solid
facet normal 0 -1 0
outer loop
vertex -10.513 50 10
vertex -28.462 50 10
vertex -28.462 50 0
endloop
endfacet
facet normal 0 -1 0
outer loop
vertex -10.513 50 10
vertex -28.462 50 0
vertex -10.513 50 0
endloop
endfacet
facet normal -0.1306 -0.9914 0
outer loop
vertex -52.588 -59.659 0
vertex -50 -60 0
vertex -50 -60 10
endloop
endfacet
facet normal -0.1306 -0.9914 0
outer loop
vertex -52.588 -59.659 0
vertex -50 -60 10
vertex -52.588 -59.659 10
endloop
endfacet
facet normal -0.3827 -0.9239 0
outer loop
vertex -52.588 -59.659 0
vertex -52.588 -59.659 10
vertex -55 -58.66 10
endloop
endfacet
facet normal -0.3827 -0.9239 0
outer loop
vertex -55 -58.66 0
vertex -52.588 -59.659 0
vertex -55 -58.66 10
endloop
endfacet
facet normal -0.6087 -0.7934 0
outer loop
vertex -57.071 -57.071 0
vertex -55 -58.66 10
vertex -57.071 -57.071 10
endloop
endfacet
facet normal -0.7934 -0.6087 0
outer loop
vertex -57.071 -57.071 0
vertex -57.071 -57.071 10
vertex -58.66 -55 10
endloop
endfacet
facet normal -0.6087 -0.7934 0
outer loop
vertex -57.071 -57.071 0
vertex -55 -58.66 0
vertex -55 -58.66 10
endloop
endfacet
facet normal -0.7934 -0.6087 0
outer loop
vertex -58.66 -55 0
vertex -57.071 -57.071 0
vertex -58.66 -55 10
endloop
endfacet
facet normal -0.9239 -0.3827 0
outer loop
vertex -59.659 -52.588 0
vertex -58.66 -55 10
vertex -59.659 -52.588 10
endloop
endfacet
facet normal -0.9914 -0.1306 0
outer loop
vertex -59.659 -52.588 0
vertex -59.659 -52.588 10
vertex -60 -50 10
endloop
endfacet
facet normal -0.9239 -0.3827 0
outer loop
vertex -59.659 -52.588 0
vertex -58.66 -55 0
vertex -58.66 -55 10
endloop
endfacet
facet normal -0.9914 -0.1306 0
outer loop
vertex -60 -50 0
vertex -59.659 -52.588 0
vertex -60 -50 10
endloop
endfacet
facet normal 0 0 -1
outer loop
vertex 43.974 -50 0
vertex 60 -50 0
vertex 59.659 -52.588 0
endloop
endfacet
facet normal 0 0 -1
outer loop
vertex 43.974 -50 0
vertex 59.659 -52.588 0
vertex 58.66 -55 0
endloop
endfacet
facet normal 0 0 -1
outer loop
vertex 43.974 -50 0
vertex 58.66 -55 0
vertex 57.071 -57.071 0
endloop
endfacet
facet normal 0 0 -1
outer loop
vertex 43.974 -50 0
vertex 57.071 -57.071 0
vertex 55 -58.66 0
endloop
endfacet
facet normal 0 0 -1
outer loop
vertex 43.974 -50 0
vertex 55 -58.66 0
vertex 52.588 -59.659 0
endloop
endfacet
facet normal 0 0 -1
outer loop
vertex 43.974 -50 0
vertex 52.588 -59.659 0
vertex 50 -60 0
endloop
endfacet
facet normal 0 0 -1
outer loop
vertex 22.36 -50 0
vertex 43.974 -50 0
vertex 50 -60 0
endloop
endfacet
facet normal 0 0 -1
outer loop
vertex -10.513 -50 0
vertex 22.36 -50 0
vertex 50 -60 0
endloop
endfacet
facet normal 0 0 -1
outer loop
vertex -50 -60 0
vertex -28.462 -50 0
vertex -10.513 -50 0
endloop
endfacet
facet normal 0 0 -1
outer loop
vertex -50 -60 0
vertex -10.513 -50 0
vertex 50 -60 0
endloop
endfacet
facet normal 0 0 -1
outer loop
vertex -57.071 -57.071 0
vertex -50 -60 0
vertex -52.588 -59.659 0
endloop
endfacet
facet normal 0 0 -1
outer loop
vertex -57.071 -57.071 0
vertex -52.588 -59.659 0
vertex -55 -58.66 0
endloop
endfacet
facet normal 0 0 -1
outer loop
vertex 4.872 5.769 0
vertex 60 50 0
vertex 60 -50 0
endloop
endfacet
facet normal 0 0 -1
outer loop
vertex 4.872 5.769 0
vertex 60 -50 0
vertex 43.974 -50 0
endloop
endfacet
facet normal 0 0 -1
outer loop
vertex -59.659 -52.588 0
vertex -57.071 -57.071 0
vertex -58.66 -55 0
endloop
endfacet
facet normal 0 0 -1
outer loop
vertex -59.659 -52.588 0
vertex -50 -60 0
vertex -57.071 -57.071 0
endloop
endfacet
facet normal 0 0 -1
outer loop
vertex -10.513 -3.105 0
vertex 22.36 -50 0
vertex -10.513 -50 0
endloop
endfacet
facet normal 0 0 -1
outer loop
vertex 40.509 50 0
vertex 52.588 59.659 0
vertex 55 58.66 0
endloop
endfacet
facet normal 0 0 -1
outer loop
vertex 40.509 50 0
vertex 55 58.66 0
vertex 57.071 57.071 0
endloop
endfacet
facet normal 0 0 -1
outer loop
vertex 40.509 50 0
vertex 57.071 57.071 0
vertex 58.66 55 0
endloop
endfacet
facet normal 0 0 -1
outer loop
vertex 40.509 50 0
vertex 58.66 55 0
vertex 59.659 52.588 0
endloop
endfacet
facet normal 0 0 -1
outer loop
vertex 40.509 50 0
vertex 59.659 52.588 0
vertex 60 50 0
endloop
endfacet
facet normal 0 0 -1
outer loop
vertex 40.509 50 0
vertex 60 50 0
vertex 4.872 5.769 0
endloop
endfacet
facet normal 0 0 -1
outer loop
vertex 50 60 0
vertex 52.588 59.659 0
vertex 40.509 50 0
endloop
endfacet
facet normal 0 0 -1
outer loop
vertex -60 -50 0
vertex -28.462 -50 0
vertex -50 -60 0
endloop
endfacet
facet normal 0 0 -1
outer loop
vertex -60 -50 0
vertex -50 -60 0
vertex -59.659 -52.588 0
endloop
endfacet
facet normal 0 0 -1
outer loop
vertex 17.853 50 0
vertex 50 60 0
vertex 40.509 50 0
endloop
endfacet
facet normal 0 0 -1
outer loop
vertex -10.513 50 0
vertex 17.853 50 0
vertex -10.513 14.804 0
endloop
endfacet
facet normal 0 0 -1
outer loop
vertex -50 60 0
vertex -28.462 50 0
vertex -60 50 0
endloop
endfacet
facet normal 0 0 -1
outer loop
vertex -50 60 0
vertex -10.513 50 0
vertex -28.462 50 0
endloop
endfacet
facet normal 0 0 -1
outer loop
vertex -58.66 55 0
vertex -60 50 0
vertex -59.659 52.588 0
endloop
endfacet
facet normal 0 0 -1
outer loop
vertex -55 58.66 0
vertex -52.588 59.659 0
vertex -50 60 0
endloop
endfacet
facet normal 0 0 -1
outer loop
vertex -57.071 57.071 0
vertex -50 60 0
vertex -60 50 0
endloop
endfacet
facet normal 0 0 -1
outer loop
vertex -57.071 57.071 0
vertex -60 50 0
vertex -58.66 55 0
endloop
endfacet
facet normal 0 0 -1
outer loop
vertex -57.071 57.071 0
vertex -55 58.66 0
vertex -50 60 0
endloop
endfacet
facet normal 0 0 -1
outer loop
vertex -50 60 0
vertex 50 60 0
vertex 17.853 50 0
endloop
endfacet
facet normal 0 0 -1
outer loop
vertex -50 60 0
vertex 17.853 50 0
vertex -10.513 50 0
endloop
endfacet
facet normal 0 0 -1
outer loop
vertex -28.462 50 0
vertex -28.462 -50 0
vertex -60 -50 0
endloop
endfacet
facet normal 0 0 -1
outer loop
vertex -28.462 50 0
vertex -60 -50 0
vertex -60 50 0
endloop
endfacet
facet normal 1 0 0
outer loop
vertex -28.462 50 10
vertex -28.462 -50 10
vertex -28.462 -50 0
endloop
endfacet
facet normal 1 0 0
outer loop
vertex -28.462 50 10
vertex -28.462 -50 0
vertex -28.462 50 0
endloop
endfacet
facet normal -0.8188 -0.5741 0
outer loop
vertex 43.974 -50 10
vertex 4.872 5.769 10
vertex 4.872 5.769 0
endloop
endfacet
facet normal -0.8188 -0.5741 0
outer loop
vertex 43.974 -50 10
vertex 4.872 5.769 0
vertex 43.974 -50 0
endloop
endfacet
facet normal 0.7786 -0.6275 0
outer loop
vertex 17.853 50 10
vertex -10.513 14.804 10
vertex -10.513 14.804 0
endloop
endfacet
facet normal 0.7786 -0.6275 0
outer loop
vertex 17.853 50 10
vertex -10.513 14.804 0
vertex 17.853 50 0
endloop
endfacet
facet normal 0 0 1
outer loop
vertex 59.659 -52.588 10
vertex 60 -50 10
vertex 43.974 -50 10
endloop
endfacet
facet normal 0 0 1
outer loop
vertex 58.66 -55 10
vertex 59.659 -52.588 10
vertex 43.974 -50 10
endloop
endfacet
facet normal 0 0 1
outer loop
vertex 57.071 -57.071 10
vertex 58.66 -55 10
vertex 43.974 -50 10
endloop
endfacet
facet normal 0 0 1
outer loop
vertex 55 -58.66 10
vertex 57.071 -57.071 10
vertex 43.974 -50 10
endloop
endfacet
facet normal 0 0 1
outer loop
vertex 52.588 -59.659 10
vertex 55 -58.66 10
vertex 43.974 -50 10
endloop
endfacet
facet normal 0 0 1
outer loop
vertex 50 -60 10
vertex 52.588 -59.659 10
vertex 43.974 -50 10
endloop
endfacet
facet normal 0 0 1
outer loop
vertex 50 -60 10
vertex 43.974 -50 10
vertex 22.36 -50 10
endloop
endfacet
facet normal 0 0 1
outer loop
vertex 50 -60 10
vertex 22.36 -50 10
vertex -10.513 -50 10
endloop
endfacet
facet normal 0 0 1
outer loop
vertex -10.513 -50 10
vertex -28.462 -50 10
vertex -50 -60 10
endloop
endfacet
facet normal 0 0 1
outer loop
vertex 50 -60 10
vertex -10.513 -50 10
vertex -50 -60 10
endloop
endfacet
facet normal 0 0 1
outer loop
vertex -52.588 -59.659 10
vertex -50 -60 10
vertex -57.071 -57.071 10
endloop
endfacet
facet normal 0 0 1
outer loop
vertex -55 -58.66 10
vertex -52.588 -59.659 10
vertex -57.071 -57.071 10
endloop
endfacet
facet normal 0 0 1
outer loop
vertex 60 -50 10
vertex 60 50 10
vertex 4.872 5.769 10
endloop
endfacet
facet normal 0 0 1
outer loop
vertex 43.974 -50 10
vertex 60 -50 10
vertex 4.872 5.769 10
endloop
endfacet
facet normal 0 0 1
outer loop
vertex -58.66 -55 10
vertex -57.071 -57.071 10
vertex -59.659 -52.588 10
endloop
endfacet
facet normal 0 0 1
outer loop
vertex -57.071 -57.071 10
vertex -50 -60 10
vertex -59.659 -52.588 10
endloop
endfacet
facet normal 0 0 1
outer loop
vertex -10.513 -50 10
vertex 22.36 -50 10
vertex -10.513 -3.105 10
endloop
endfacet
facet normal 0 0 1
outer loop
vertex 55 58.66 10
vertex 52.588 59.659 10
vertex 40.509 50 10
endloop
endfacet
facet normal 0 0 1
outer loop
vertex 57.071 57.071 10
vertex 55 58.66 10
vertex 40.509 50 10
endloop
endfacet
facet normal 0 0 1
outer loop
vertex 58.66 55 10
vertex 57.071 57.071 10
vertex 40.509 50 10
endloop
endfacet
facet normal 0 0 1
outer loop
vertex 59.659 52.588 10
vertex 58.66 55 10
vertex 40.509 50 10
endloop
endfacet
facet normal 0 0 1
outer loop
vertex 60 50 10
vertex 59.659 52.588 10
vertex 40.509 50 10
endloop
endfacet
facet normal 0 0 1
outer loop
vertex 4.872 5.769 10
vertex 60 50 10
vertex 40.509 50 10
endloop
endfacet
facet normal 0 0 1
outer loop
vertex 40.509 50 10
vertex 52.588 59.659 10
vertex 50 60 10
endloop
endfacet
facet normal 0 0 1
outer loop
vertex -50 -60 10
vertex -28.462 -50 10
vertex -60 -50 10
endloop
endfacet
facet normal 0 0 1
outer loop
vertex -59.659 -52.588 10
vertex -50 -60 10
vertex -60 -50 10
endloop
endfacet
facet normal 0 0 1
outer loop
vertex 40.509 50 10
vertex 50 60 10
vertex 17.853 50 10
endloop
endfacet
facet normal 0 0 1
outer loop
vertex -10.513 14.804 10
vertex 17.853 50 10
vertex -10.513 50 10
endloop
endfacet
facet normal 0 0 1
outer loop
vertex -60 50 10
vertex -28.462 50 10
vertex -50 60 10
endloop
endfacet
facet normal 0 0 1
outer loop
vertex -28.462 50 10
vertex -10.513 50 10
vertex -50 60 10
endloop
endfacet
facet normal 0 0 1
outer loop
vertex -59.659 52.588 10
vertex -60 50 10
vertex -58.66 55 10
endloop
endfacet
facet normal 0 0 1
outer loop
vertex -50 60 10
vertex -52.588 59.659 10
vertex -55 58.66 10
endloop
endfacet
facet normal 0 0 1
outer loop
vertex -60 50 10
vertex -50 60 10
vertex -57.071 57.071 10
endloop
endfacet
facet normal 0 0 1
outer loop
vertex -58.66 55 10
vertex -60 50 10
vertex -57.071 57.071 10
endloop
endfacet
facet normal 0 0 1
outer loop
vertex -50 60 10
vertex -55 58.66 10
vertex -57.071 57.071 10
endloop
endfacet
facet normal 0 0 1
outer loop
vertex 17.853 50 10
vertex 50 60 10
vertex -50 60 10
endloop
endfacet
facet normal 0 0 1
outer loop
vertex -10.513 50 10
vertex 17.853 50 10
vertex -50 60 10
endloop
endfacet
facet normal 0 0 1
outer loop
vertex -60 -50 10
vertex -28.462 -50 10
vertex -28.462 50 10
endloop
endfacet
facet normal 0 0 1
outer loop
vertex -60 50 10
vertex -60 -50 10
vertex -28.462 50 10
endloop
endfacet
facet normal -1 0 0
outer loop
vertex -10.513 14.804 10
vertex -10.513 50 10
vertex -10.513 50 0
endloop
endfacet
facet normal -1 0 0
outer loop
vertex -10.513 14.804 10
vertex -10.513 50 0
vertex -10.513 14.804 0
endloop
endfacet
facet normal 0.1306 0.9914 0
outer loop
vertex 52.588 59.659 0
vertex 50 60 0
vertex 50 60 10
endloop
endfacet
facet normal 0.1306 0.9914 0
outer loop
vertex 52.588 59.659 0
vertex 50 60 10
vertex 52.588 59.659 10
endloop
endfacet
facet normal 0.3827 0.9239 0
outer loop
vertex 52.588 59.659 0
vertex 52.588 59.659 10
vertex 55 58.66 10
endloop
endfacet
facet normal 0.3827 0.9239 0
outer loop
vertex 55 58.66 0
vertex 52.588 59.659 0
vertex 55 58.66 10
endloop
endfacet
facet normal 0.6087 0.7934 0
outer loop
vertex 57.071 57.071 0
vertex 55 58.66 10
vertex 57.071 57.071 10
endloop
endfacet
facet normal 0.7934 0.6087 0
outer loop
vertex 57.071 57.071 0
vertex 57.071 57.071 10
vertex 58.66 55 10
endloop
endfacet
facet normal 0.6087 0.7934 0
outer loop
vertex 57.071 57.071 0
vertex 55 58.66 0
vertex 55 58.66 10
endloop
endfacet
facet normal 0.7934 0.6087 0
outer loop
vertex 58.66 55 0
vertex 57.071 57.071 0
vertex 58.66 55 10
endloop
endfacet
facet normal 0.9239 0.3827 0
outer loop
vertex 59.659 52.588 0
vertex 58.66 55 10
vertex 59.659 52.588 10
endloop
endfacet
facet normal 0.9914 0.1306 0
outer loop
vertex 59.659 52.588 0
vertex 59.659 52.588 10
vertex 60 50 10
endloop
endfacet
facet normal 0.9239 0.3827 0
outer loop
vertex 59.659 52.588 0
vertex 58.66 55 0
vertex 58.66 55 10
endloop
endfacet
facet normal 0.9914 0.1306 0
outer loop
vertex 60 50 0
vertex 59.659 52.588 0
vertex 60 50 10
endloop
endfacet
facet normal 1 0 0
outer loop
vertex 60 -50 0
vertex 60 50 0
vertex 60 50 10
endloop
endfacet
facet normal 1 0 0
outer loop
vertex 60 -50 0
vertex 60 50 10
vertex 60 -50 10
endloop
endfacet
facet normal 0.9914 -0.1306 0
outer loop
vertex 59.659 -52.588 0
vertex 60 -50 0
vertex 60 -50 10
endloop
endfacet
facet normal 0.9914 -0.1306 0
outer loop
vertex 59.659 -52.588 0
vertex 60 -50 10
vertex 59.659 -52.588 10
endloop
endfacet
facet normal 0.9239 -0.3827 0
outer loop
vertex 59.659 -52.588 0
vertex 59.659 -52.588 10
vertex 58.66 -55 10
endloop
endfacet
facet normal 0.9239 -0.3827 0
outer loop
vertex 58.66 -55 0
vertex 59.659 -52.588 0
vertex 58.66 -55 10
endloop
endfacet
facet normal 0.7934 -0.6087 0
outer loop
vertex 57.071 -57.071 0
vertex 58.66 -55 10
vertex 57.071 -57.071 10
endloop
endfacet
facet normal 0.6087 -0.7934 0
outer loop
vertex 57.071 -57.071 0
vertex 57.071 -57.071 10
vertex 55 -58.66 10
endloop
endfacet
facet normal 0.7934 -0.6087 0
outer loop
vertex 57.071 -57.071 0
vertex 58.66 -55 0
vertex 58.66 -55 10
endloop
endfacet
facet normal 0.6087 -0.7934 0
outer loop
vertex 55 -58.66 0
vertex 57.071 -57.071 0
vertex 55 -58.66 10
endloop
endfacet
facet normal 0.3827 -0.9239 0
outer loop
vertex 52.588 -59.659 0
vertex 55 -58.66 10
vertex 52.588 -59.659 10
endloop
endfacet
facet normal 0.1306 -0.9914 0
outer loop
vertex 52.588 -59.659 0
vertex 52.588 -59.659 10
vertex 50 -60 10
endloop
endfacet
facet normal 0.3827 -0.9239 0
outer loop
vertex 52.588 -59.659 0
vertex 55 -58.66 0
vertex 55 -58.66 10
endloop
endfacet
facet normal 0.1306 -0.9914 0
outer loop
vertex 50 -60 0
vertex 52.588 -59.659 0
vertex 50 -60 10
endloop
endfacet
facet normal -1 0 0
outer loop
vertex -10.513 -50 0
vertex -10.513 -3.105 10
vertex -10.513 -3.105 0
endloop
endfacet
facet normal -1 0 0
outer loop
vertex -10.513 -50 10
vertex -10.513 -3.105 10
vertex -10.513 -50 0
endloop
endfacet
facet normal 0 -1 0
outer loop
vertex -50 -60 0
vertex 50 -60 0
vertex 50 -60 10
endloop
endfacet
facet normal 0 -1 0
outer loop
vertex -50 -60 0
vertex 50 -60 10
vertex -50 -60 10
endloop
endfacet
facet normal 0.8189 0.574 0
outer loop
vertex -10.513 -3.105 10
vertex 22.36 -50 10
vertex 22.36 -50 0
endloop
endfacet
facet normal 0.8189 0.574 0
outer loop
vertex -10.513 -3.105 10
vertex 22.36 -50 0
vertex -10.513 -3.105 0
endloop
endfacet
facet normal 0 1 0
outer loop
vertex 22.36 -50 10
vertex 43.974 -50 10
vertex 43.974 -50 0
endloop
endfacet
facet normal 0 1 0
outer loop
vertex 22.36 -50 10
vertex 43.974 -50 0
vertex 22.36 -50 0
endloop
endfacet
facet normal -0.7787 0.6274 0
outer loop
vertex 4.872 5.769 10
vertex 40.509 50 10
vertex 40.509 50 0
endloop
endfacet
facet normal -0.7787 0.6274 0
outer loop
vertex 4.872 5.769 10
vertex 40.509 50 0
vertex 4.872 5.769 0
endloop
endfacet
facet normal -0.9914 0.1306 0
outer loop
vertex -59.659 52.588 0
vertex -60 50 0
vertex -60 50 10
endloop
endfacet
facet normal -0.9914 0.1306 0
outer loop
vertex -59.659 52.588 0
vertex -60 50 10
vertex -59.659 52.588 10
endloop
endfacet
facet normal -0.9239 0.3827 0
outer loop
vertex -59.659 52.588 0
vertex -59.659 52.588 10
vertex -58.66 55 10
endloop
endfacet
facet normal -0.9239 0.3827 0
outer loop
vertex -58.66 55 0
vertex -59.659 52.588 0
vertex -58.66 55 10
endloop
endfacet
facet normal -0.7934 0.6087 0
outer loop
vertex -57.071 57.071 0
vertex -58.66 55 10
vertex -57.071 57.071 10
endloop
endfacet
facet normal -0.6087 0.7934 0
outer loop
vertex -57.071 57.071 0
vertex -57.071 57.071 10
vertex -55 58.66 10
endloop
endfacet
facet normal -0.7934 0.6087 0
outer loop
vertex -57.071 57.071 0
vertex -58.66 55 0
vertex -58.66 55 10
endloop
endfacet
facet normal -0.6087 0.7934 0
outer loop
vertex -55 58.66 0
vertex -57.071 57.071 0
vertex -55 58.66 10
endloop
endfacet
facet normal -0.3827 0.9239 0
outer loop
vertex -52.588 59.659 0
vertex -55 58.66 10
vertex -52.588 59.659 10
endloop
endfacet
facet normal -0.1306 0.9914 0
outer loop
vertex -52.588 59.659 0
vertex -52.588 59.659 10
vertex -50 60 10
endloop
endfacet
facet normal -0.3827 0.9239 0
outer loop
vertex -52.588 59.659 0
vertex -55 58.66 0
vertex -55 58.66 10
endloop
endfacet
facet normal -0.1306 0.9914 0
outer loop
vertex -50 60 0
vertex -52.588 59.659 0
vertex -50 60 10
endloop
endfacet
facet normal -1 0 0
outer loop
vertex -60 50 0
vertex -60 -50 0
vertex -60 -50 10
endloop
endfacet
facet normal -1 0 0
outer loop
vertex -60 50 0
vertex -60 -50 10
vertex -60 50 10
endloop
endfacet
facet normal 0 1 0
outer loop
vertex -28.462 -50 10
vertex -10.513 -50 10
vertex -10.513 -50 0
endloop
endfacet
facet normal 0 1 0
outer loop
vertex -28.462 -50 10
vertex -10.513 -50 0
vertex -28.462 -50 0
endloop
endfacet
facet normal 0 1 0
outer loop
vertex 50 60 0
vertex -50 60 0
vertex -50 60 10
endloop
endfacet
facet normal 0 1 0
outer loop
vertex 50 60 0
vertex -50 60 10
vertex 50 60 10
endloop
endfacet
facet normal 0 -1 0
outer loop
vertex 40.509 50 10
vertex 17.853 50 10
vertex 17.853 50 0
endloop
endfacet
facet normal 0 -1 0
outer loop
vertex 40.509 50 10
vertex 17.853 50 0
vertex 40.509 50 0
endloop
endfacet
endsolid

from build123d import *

# Parameters (mm, degrees)
BOSS_EXTRUDE1_DEPTH = 10
CUT_EXTRUDE24_DEPTH = 10


with BuildPart() as part:
    # Sketch1 → Boss-Extrude1 (new body)
    with BuildSketch(Plane.XY):
        with BuildLine():
            Line((-50, 60), (50, 60))
            ThreePointArc((50, 60), (57.071067812, 57.071067812), (60, 50))
            Line((60, 50), (60, -50))
            ThreePointArc((60, -50), (57.071067812, -57.071067812), (50, -60))
            Line((50, -60), (-50, -60))
            ThreePointArc((-50, -60), (-57.071067812, -57.071067812), (-60, -50))
            Line((-60, -50), (-60, 50))
            ThreePointArc((-60, 50), (-57.071067812, 57.071067812), (-50, 60))
        make_face()
    extrude(amount=BOSS_EXTRUDE1_DEPTH)

    # Sketch2 → Cut-Extrude24 (cut)
    with BuildSketch(Plane.XY.offset(10)):
        Polygon((-28.461538462, 50), (-10.512820513, 50), (-10.512820513, 14.803685897), (17.852564103, 50), (40.508814103, 50), (4.871794872, 5.769230769), (43.974358974, -50), (22.359775641, -50), (-10.512820513, -3.104967949), (-10.512820513, -50), (-28.461538462, -50), align=None)
    extrude(amount=-CUT_EXTRUDE24_DEPTH, mode=Mode.SUBTRACT)


solid = part.part
